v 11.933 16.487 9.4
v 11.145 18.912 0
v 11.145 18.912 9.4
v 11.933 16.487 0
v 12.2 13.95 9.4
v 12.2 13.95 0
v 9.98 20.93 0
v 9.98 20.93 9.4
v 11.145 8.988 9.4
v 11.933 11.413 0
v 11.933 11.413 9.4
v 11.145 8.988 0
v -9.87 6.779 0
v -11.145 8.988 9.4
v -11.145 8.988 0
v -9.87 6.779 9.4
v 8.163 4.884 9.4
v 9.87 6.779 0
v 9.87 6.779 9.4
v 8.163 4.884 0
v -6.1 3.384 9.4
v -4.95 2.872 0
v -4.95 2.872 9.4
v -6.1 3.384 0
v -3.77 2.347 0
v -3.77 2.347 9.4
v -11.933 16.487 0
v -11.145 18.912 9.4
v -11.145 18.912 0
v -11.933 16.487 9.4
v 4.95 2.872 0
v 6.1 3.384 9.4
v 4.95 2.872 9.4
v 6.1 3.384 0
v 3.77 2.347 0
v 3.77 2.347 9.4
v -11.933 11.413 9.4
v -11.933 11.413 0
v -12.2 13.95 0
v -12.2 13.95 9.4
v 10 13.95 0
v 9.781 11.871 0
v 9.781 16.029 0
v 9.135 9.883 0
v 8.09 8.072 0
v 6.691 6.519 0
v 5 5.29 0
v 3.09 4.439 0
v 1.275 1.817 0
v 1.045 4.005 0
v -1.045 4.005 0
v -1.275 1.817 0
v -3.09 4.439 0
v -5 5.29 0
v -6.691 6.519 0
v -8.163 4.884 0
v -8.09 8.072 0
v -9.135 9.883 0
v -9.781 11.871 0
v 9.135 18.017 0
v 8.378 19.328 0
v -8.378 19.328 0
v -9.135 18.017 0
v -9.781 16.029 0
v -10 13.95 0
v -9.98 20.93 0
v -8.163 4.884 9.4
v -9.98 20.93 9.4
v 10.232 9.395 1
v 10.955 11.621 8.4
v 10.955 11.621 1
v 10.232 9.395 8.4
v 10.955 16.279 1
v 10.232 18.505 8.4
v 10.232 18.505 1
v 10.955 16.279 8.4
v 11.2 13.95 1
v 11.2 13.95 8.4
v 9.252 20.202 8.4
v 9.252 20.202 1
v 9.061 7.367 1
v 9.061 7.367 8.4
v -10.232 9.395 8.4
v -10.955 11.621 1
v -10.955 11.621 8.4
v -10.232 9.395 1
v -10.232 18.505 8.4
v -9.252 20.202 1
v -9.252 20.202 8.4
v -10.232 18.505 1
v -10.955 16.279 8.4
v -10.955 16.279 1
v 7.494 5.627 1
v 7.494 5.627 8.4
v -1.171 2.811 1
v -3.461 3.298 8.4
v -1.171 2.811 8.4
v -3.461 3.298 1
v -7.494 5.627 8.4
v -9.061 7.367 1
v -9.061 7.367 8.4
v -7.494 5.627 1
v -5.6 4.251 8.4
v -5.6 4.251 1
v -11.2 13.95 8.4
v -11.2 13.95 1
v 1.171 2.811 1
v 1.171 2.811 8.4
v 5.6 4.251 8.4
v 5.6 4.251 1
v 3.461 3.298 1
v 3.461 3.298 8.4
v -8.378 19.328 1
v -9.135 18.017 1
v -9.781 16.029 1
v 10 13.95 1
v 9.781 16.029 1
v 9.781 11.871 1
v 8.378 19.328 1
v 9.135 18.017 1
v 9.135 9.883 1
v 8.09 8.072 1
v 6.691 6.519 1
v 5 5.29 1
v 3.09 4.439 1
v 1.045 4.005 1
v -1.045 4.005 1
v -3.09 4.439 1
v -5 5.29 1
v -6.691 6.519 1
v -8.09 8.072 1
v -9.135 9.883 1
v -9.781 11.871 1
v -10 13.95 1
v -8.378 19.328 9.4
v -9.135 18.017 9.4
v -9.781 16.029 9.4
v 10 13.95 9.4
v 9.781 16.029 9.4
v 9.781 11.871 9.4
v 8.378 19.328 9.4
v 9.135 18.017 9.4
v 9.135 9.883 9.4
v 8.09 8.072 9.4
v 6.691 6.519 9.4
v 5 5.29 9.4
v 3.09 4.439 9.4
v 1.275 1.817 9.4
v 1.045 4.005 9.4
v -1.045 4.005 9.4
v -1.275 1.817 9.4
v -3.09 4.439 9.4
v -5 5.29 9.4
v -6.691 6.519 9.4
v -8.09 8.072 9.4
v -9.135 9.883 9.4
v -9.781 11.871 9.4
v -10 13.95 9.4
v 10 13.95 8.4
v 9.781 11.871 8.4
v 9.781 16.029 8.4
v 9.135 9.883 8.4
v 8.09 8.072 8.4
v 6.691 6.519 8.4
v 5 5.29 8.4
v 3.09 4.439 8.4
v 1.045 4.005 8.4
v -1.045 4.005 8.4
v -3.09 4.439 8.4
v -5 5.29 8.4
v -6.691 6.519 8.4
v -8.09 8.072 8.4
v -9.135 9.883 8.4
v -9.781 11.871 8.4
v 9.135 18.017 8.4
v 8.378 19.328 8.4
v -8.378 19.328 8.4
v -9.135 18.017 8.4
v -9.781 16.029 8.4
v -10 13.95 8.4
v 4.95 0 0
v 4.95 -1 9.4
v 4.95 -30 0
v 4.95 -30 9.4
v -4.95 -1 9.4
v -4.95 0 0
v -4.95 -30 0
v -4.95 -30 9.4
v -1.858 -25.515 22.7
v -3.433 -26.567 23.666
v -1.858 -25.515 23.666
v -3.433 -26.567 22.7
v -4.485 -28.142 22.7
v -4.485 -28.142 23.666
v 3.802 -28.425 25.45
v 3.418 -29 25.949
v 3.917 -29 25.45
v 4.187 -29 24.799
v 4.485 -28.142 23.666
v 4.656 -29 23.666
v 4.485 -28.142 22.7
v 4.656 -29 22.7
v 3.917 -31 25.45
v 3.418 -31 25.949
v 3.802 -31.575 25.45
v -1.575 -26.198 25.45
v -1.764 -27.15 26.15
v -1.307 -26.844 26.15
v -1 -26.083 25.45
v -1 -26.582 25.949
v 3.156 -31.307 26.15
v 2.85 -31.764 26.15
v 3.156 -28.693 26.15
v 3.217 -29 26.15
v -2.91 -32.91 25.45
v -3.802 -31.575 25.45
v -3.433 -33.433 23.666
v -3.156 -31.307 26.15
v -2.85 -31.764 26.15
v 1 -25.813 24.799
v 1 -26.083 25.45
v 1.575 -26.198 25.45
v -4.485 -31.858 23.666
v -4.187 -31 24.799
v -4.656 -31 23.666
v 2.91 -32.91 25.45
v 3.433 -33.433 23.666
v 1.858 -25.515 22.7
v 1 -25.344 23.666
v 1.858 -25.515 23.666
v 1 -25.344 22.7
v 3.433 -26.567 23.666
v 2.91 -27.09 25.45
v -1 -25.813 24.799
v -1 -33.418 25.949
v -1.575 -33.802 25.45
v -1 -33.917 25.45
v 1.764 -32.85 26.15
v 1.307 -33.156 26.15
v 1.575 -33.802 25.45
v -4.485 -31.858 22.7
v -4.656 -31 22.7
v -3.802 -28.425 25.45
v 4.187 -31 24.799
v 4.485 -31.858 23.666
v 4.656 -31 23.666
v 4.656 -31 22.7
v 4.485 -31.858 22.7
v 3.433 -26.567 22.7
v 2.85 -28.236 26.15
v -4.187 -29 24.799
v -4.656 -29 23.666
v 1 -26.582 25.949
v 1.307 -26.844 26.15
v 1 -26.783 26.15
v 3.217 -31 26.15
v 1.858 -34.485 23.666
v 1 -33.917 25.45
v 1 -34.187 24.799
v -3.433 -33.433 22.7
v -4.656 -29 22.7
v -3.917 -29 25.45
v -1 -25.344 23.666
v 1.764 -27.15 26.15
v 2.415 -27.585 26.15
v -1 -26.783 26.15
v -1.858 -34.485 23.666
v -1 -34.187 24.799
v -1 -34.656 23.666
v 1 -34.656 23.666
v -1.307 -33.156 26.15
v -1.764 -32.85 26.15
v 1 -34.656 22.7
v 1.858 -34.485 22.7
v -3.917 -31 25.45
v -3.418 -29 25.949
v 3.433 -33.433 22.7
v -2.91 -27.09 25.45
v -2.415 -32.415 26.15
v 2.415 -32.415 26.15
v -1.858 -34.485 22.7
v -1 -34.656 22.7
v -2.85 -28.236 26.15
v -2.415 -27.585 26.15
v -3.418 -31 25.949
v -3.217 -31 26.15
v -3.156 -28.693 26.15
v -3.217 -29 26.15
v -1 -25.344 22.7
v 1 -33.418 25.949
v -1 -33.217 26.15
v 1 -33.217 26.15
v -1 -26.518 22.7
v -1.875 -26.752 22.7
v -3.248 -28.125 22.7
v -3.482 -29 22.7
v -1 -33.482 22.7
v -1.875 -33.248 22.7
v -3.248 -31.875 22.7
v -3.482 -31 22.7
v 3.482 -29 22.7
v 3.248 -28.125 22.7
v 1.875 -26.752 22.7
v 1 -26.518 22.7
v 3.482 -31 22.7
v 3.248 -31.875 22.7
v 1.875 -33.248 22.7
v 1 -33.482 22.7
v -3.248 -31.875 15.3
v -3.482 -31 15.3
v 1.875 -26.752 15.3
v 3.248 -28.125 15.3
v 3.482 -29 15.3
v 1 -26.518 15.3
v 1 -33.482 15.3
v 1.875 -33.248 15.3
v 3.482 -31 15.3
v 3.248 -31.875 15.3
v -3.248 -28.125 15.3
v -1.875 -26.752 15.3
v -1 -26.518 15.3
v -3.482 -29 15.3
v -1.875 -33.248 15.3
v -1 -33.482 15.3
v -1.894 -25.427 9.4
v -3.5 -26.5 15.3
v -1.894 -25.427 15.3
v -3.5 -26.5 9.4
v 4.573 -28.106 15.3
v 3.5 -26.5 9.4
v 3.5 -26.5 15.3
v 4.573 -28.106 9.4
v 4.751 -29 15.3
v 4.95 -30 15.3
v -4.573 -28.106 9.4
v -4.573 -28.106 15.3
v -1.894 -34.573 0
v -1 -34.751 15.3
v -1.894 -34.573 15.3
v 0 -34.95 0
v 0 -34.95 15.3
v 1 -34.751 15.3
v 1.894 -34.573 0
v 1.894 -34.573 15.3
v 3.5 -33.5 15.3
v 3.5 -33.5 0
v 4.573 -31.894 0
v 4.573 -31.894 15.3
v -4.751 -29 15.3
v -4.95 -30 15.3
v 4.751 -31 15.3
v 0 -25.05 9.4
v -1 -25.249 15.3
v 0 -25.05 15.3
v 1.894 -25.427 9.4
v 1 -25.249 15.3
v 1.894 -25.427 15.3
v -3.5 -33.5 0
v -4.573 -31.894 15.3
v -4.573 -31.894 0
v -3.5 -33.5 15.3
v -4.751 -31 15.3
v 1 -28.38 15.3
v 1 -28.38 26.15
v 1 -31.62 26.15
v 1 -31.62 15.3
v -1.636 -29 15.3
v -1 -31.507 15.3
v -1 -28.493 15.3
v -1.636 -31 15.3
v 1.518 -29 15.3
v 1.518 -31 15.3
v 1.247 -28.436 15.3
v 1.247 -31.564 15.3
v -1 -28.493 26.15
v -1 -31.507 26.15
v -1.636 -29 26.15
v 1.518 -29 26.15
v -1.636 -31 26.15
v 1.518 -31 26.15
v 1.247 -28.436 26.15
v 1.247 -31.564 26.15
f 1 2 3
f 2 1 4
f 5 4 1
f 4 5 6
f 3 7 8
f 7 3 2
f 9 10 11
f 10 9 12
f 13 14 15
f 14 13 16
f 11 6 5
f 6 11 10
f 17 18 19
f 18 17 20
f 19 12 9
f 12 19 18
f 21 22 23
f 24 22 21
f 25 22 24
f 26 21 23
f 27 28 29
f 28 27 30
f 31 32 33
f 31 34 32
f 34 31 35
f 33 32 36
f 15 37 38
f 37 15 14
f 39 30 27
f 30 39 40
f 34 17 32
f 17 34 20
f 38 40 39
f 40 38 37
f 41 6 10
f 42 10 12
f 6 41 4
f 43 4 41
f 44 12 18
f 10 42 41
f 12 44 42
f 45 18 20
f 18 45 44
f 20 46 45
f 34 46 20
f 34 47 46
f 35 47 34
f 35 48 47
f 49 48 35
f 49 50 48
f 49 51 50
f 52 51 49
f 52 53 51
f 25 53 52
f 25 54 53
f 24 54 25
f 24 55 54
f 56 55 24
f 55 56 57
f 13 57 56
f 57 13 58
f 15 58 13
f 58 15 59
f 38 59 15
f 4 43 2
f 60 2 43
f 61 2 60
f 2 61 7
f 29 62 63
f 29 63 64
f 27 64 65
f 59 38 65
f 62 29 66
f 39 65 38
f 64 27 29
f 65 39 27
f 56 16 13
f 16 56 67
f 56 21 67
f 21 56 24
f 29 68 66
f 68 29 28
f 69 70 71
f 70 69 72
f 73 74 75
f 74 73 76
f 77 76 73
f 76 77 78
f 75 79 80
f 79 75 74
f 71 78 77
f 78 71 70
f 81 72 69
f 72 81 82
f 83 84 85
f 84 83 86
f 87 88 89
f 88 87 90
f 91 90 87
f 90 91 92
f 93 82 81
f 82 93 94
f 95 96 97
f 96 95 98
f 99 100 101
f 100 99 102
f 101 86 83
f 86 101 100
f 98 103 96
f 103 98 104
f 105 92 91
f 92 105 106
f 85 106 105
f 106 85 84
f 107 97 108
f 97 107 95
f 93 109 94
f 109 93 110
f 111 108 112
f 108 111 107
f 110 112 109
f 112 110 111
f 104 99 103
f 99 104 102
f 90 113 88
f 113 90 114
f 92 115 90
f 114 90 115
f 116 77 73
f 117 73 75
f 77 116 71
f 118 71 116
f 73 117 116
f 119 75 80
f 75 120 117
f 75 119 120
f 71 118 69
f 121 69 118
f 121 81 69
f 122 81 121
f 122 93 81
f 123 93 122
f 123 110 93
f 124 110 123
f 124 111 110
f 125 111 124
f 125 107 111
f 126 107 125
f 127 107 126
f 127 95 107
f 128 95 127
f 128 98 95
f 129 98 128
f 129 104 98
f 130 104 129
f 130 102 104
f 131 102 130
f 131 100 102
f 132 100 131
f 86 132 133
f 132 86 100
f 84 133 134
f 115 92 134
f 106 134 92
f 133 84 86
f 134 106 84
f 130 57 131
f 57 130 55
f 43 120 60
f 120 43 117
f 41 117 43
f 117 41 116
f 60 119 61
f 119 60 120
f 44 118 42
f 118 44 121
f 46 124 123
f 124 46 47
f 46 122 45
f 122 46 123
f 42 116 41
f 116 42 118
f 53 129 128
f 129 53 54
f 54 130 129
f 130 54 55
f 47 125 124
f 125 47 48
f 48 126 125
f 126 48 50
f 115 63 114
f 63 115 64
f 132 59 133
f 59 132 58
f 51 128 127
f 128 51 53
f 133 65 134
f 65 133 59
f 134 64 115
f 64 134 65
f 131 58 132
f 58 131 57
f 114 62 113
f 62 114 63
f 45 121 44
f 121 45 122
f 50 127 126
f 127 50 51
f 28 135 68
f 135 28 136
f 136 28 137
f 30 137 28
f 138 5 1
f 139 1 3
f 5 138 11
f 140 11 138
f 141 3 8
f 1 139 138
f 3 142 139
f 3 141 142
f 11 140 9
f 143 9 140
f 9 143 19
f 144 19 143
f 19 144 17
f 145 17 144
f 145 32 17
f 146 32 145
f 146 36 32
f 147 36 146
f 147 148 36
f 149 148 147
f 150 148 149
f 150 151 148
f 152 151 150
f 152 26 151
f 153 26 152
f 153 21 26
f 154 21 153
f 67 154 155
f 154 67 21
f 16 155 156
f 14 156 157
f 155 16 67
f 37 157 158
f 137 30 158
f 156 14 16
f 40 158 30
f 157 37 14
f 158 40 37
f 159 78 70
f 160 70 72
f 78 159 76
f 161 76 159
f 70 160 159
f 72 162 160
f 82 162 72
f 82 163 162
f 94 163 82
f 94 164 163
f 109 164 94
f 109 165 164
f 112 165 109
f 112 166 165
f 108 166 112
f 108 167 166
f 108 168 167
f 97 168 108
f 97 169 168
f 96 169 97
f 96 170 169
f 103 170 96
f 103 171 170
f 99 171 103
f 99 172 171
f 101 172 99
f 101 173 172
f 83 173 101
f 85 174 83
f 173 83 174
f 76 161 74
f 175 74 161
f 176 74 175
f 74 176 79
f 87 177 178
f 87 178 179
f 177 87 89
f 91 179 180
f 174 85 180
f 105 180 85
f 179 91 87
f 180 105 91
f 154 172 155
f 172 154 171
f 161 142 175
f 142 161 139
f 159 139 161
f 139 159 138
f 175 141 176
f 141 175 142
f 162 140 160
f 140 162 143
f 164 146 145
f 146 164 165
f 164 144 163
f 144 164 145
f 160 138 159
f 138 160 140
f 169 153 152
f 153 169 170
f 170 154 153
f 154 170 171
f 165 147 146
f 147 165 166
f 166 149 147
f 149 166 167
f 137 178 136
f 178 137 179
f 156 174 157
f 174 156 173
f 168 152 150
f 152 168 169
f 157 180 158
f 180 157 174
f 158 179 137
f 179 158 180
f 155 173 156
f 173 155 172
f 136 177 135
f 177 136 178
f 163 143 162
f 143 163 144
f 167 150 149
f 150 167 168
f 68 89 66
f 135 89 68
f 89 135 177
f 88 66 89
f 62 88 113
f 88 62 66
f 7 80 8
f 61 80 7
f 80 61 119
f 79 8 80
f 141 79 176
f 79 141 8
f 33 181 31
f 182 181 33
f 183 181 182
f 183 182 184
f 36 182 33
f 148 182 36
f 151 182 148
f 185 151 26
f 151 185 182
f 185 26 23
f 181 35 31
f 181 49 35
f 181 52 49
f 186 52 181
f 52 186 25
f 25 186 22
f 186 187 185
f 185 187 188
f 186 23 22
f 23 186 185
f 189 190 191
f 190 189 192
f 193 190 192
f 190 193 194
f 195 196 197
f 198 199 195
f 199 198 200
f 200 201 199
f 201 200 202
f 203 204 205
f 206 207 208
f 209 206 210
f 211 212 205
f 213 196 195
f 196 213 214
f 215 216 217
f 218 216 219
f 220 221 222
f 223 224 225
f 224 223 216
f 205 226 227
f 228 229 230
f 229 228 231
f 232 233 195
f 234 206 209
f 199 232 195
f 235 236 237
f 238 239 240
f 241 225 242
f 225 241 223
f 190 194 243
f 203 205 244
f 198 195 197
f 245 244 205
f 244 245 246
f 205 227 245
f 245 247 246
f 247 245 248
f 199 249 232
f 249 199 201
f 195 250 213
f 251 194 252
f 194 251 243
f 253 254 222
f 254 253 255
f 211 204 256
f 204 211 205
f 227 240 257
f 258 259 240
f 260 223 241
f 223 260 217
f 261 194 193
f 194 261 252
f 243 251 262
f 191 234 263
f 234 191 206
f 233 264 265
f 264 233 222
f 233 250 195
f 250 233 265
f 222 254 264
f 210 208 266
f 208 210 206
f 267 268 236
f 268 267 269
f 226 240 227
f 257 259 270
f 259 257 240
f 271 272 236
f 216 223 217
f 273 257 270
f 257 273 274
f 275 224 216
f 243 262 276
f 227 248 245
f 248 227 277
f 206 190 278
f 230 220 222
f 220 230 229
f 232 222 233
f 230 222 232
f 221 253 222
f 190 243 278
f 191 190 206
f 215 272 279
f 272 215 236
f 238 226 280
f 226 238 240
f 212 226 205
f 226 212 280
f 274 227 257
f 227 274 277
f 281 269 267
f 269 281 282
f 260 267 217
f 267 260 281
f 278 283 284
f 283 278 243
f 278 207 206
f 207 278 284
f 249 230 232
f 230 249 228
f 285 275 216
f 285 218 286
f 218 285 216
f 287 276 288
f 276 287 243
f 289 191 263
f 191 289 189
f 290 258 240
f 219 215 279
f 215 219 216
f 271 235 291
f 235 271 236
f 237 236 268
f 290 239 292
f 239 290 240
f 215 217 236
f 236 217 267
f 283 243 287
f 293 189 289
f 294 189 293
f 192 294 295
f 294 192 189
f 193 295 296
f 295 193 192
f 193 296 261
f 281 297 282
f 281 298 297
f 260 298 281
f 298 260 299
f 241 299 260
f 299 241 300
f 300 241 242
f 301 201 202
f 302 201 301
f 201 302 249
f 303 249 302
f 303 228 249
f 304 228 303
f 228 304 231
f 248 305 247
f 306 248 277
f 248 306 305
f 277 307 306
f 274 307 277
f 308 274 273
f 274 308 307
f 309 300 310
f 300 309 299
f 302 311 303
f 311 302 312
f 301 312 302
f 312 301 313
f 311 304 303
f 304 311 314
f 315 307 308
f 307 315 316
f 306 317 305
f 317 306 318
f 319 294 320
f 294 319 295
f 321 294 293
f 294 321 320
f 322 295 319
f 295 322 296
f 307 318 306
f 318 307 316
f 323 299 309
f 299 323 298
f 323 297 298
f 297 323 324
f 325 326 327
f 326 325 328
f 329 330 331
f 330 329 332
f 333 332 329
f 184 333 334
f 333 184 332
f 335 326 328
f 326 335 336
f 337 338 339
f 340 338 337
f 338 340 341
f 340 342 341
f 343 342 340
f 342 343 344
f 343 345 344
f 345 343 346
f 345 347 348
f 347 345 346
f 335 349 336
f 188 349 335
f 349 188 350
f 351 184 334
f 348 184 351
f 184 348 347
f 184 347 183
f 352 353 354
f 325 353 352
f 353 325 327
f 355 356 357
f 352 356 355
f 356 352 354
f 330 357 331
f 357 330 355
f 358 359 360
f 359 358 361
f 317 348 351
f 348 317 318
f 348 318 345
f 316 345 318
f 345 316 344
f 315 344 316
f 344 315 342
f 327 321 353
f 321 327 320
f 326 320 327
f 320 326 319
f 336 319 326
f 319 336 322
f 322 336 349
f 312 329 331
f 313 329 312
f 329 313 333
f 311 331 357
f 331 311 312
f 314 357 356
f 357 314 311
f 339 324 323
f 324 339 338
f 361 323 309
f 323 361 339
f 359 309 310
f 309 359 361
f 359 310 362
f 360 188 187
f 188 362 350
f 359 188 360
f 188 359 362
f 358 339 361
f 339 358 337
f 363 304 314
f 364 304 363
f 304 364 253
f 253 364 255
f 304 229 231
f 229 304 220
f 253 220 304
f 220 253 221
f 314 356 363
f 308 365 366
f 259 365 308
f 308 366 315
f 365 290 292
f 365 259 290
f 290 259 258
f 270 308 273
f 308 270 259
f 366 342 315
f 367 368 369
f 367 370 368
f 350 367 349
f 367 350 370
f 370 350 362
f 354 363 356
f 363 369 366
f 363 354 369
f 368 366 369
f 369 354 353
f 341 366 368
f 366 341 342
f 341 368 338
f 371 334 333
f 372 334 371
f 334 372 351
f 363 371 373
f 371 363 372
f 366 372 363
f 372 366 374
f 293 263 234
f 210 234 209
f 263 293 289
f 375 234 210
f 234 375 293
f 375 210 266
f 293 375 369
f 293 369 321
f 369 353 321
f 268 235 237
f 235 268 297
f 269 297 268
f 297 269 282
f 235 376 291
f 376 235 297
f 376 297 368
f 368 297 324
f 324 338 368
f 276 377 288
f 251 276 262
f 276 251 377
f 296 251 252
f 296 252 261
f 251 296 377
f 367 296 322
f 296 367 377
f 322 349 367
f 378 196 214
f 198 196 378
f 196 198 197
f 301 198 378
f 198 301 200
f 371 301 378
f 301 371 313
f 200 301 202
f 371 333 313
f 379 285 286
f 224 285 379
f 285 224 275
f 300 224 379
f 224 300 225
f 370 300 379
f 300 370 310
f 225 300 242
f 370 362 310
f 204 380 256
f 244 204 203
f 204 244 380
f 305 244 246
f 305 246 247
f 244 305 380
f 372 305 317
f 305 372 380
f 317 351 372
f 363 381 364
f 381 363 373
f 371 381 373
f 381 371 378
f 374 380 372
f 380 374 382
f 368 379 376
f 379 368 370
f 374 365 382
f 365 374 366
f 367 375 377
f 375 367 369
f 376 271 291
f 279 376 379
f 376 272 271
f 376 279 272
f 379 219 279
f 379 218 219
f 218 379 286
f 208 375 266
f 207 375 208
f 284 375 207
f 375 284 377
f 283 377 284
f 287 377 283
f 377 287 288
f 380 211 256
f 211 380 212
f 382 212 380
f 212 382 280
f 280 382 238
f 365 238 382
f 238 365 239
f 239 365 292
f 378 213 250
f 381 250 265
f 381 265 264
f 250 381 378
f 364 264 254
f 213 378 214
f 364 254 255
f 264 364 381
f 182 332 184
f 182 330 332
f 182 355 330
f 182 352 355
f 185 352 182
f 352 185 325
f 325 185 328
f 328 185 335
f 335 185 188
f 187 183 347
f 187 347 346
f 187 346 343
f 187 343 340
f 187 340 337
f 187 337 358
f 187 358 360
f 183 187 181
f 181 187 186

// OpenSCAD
LINK_LENGTH = 30;

module link() {
    BEARING_HEIGHT = 7;
    BEARING_OUTER_DIAMETER = 22;
    BEARING_INNER_DIAMETER = 7.9;

    TOLERANCE = .2;
    ADD_HEIGHT = 1;
    LINK_WIDTH = BEARING_INNER_DIAMETER + 2 * ADD_HEIGHT;
    FEMALE_HEIGHT = BEARING_HEIGHT + 2 * (ADD_HEIGHT + TOLERANCE);
    FEMALE_LENGTH = 11;
    MALE_TIP_SUB = 1.5;
    TIP_HEIGHT = BEARING_INNER_DIAMETER / 2 + ADD_HEIGHT - MALE_TIP_SUB;
    MALE_LENGTH = TIP_HEIGHT * 2 - ADD_HEIGHT;
    MALE_INNER = ADD_HEIGHT*2;

    function getConstants() = [
      FEMALE_HEIGHT,
      LINK_WIDTH,
    ];

    module bearing(
        extraOuterDiameter=0, 
        extraInnerDiameter=0, 
        extraHeight=0
    ) {
        difference() {
            cylinder(
                d=BEARING_OUTER_DIAMETER + extraOuterDiameter, 
                h=BEARING_HEIGHT + extraHeight
            );
            
            translate([0, 0, -.5])
            cylinder(
                d=BEARING_INNER_DIAMETER + extraInnerDiameter, 
                h=BEARING_HEIGHT + extraHeight +1
            );
        }
    }
        
    module femaleTop() {
        bearing(
            extraOuterDiameter=(ADD_HEIGHT + TOLERANCE)*2,
            extraHeight=ADD_HEIGHT-BEARING_HEIGHT,
            extraInnerDiameter=(BEARING_OUTER_DIAMETER -
                BEARING_INNER_DIAMETER - 2*ADD_HEIGHT)
        );
    }

    function femaleAlignment() = [
        0, 
        FEMALE_LENGTH + BEARING_INNER_DIAMETER / 2,
        ADD_HEIGHT + TOLERANCE
    ];

    module female(align=false, withBearing=false) {
        translate(align ? femaleAlignment() : [0, 0, 0]) {
            if (withBearing) %bearing();
            difference() {
                union() {
                    translate([0,0,-1*(ADD_HEIGHT+TOLERANCE)])
                    bearing(
                        extraOuterDiameter= 2 * (
                            ADD_HEIGHT + 
                            TOLERANCE
                        ), 
                        extraInnerDiameter=
                            BEARING_OUTER_DIAMETER -
                            BEARING_INNER_DIAMETER +
                            TOLERANCE * 2,
                        extraHeight= 2 * (
                            ADD_HEIGHT + 
                            TOLERANCE
                        )
                    );
                    
                    translate([0,0,-1*(ADD_HEIGHT+TOLERANCE)])
                    femaleTop();
                    
                    translate([0,0,BEARING_HEIGHT+TOLERANCE])
                    femaleTop();
                }
               
                translate([0, -3, -50])
                rotate([0, 0, 45])
                cube(100, 100, 100);
            }
            
            // link
            difference() {
                translate([
                    0, 
                    -BEARING_INNER_DIAMETER / 2, 
                    (
                        BEARING_HEIGHT + 
                        2 * (ADD_HEIGHT + TOLERANCE)
                    ) / 2 - 
                    (ADD_HEIGHT + TOLERANCE)
                ])
                cube([
                  LINK_WIDTH, 
                  FEMALE_LENGTH * 2,
                  FEMALE_HEIGHT,
                ], center=true);
                
                translate([0, 0, -50])
                cylinder(h=BEARING_HEIGHT + 100, d=BEARING_OUTER_DIAMETER + TOLERANCE*2);
            }
        }
    }

    function maleAlignment() = [0, 0, ADD_HEIGHT + MALE_LENGTH + TOLERANCE];

    module male(align=false, withBearing=false) {
        translate(align ? maleAlignment() : [0,0,0]) {
            if (withBearing) %bearing();
            difference() {
                union() {
                    translate([0, 0, -1 * (TOLERANCE + ADD_HEIGHT) - MALE_LENGTH])
                    cylinder(
                        d=BEARING_INNER_DIAMETER - 2 * TOLERANCE, 
                        h=BEARING_HEIGHT + 2 * (ADD_HEIGHT + TOLERANCE) + MALE_LENGTH
                    );
                    
                    // tip
                    translate([0, 0, BEARING_HEIGHT + TOLERANCE])
                    difference() {
                        sphere(
                            d=BEARING_INNER_DIAMETER + 2 * ADD_HEIGHT, 
                            h=ADD_HEIGHT
                        );
                    
                        translate([0,0,-50])
                        cube([100, 100, 100], center=true);
                    }
                    
                    // base
                    translate([0, 0, -1*(ADD_HEIGHT + TOLERANCE) - MALE_LENGTH])
                    cylinder(
                        d=LINK_WIDTH, 
                        h=ADD_HEIGHT + MALE_LENGTH
                    );
                }
            
                union() {
                    translate([0, 0, 50 - TOLERANCE]) {
                        cube([MALE_INNER, 100, 100], center=true);
                        cube([100, MALE_INNER, 100], center=true);
                        cylinder(h=100, r=MALE_INNER, center=true);
                    }
                    
                    translate([0, 0, 
                      BEARING_HEIGHT + TOLERANCE + TIP_HEIGHT
                    ])
                    translate([0, 0, 50])
                    cube([100, 100, 100], center=true);
                }
            }
        }
    }

    module fmLink(n, withBearing=false, showMates=false) {
        // female
        translate([0, -1, 0]) // make sure it's inside the link
        translate(femaleAlignment()) {
            female(withBearing=withBearing);

            if (showMates) {
                rotate([0, 0, $t * 360])
                male();
            }
        }
        
        // link
        length = LINK_LENGTH * n;
        translate([0, -length/2, FEMALE_HEIGHT/2])
        cube([LINK_WIDTH, length, FEMALE_HEIGHT], center=true);
        
        // curved end for male link
        translate([0, -length, 0])
        cylinder(d=LINK_WIDTH, h=FEMALE_HEIGHT);
        
        // male
        translate([0, 0, -1]) // make sure it's inside the link
        translate([0, -length, FEMALE_HEIGHT]) 
        translate(maleAlignment()) {
            male(withBearing=withBearing);
            
            if (showMates) {
                rotate([0, 0, $t * 360])
                female();
            }
        }
    }
    
    fmLink(1);
}

link();
